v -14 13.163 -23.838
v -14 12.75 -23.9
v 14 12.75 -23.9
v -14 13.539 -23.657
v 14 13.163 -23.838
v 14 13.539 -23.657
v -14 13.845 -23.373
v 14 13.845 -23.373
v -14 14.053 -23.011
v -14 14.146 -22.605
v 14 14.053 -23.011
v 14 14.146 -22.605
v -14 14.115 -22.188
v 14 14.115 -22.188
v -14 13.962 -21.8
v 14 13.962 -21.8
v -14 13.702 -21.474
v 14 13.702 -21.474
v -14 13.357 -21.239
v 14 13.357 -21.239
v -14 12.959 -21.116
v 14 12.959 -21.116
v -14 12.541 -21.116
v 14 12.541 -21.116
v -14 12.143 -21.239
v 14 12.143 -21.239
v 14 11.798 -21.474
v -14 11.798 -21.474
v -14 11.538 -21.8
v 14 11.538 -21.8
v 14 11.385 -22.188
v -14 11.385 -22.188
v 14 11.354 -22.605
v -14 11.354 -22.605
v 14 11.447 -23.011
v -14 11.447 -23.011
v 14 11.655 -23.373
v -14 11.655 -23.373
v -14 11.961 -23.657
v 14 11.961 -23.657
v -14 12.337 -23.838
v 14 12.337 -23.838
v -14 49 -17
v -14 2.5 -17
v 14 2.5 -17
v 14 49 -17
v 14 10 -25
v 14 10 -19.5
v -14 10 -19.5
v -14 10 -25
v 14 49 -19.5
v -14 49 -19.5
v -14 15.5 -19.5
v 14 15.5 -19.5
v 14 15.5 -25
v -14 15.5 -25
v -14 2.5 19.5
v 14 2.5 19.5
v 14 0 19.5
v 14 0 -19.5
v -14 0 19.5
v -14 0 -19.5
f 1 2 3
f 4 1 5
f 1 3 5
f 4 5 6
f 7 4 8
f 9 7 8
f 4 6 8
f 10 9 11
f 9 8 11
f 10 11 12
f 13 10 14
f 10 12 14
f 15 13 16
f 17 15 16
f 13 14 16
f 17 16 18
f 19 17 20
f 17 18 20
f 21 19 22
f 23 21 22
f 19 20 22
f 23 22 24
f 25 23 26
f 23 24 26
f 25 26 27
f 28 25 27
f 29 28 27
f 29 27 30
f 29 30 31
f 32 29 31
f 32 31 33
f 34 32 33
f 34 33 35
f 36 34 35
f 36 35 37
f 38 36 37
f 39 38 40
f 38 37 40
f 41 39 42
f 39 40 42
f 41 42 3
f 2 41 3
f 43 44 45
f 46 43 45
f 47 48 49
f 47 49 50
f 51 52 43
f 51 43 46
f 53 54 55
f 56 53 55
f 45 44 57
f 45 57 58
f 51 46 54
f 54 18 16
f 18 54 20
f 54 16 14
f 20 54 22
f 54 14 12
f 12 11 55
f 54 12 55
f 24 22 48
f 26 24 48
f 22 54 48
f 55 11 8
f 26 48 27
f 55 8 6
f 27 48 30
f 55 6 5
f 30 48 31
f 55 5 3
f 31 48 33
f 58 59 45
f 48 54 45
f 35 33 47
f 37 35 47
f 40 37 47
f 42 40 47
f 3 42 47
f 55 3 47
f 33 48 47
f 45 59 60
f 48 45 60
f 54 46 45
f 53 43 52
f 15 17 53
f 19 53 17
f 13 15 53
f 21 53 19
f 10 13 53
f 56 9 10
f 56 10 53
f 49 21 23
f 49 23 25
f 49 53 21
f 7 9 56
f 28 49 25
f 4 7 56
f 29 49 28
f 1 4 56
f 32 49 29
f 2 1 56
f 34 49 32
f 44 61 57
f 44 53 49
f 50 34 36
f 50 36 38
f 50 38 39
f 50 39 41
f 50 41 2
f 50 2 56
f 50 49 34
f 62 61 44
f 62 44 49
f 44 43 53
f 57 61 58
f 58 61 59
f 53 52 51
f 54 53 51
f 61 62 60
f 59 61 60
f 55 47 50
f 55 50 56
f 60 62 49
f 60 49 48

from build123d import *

# Parameters (mm, degrees)
SKETCH1_W           = 28
SKETCH1_H           = 39
BOSS_EXTRUDE1_DEPTH = 2.5
SKETCH2_W           = 28
SKETCH2_H           = 2.5
BOSS_EXTRUDE2_DEPTH = 46.5
SKETCH3_W           = 5.5
SKETCH3_H           = 5.5
SKETCH3_R           = 1.4
BOSS_EXTRUDE3_DEPTH = 28


with BuildPart() as part:
    # Sketch1 → Boss-Extrude1 (new body)
    with BuildSketch(Plane(origin=(0, 0, 0), x_dir=(1, 0, 0), z_dir=(0, 1, 0))):
        Rectangle(SKETCH1_W, SKETCH1_H)
    extrude(amount=BOSS_EXTRUDE1_DEPTH)

    # Sketch2 → Boss-Extrude2 (add)
    with BuildSketch(Plane(origin=(0, 2.5, 0), x_dir=(1, 0, 0), z_dir=(0, 1, 0))):
        with Locations((0, 18.25)):
            Rectangle(SKETCH2_W, SKETCH2_H)
    extrude(amount=BOSS_EXTRUDE2_DEPTH)

    # Sketch3 → Boss-Extrude3 (add)
    with BuildSketch(Plane(origin=(14, 0, 0), x_dir=(0, 0, -1), z_dir=(1, 0, 0))):
        with Locations((22.25, 12.75)):
            Rectangle(SKETCH3_W, SKETCH3_H)
        with Locations((22.5, 12.75)):
            Circle(SKETCH3_R, mode=Mode.SUBTRACT)
    extrude(amount=-BOSS_EXTRUDE3_DEPTH)


solid = part.part
